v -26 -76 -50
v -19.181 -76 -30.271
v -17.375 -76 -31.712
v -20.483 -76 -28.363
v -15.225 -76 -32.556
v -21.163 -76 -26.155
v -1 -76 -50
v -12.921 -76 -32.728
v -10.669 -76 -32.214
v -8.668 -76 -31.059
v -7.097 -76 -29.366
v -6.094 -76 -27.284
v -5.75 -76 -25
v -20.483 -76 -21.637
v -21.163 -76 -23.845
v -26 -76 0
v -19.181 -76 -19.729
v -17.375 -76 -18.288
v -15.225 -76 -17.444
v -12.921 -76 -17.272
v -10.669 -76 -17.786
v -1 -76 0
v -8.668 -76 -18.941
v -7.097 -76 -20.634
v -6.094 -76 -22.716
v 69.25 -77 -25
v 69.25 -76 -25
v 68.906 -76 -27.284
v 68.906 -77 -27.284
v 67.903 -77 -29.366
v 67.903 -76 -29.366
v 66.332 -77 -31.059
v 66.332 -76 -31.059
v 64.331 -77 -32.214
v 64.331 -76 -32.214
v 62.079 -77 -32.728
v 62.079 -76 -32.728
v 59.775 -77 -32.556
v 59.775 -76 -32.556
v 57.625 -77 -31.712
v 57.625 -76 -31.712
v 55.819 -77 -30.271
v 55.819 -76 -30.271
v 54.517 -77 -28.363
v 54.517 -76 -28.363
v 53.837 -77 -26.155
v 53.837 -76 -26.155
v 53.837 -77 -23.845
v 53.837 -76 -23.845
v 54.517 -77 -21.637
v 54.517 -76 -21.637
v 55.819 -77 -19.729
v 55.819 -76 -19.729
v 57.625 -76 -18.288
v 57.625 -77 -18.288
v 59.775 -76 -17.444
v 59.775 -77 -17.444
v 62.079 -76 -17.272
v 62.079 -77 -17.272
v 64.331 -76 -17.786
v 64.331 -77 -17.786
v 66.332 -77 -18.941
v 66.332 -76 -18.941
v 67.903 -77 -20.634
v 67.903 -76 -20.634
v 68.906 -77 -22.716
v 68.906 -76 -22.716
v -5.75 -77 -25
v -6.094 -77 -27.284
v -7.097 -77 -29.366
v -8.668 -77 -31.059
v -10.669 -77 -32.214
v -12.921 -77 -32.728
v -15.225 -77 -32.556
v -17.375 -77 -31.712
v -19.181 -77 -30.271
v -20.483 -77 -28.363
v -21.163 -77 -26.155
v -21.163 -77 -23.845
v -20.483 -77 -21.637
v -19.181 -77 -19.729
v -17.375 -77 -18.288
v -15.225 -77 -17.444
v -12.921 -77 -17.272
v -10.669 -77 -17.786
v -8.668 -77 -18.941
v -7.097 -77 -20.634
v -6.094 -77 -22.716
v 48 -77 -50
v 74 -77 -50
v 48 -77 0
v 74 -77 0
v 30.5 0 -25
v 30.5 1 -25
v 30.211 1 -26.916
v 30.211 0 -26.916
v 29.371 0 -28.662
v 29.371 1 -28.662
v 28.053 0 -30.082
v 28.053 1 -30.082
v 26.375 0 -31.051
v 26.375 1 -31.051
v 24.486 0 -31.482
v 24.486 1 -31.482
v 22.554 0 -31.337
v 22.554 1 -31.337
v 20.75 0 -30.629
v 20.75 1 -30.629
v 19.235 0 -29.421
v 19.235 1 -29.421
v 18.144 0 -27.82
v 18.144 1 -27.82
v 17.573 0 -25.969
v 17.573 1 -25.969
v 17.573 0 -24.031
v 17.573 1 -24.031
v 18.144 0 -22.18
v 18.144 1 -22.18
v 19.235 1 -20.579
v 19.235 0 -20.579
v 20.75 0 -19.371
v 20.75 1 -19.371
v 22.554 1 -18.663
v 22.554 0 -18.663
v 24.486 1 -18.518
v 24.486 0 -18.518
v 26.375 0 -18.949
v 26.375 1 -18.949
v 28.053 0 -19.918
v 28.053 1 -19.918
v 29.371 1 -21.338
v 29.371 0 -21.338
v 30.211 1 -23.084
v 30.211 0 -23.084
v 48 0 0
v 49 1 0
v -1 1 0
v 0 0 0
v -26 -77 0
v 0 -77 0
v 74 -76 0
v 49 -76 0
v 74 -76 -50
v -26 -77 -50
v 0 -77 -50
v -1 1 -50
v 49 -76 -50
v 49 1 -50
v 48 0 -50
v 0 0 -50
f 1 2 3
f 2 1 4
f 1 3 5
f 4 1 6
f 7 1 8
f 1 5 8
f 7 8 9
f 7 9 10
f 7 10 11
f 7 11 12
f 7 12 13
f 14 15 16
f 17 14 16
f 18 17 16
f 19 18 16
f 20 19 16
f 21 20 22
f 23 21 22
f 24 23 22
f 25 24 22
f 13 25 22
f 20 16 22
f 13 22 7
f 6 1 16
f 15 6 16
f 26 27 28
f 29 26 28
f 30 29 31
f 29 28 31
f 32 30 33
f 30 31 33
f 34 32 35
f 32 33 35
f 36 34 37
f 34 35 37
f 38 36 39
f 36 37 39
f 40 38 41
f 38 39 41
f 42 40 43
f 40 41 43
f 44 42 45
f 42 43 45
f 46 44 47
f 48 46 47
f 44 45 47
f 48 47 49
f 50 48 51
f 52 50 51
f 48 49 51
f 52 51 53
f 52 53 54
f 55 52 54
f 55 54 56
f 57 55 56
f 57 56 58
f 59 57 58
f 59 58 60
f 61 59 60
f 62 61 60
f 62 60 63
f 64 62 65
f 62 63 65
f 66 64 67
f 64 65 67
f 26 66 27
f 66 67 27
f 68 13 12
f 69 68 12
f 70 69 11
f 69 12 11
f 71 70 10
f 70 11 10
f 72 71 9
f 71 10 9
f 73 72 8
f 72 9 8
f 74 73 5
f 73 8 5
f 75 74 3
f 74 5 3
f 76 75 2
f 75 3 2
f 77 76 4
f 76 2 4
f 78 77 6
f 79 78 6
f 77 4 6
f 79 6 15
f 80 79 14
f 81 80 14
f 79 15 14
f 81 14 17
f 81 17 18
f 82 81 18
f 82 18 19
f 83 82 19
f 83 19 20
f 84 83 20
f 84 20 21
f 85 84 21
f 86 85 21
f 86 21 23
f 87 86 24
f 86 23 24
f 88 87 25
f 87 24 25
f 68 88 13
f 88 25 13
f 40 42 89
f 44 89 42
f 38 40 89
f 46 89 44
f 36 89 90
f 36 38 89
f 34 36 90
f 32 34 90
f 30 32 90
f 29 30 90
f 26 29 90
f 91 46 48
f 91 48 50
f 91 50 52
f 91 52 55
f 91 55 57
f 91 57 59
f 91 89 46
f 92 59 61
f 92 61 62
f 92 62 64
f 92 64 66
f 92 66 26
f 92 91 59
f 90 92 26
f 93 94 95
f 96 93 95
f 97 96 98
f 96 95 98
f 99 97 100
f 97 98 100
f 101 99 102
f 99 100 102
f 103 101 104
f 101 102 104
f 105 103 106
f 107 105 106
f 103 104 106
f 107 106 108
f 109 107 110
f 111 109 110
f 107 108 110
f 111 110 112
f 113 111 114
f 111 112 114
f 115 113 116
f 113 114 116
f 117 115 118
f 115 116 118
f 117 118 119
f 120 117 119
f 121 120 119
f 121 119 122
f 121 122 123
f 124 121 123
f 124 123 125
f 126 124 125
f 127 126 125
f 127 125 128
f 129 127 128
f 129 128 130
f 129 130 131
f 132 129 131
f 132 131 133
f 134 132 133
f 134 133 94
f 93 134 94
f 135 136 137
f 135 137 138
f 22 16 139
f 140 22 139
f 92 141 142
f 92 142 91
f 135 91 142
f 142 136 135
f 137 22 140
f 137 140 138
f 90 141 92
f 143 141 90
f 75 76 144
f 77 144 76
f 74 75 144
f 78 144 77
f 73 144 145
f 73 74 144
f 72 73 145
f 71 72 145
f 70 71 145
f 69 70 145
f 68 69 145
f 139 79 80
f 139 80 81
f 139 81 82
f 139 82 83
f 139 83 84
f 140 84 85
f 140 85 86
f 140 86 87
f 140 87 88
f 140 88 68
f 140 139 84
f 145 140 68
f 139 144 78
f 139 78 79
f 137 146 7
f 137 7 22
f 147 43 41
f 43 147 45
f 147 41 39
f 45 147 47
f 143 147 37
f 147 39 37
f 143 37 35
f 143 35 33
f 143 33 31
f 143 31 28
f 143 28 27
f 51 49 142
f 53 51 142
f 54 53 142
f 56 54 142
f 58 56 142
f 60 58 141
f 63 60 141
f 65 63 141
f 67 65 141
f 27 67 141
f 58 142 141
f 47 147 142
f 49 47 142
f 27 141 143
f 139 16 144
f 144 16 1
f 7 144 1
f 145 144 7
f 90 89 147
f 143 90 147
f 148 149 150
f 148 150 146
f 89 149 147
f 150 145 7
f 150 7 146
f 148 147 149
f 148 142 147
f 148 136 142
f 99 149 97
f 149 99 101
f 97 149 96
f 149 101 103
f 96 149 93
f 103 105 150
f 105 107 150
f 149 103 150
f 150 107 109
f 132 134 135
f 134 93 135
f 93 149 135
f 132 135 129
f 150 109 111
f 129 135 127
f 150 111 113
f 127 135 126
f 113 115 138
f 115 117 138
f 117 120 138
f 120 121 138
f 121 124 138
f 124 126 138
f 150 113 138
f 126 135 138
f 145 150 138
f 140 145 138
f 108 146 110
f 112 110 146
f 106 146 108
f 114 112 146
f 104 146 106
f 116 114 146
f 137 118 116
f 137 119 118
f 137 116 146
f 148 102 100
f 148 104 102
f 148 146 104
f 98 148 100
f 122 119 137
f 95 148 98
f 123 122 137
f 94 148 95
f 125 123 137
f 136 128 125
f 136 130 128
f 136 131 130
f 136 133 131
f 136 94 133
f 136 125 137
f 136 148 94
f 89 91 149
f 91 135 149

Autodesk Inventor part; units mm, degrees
ref_plane "YZ Plane" through (0, 0, 0) normal (1, 0, 0) x (0, 1, 0)
ref_plane "XZ Plane" through (0, 0, 0) normal (0, 1, 0) x (-1, 0, 0)
ref_plane "XY Plane" through (0, 0, 0) normal (0, 0, 1) x (1, 0, 0)
sketch "Sketch1" plane through (0, 0, 0) normal (0, 1, 0) x (-1, 0, 0)
  line L0 (0, 0) -> (-48, 0)
  line L1 (-48, 0) -> (-48, -50)
  line L2 (-48, -50) -> (0, -50)
  line L3 (0, -50) -> (0, 0)
  dimension "d0" = 48
  dimension "d1" = 50
extrude "Extrusion1" add sketch "Sketch1" along normal blind 1
sketch "Sketch2" plane through (48, 0, 0) normal (1, 0, 0) x (0, 0, -1)
  line L0 (0, 1) -> (50, 1) projected
  line L1 (0, 1) -> (50, 1)
  line L2 (50, 1) -> (50, -76)
  line L3 (50, -76) -> (0, -76)
  line L4 (0, -76) -> (0, 1)
  point P0 (0, 0)
  dimension "d4" = 50
  dimension "d5" = 77
extrude "Extrusion2" add sketch "Sketch2" along normal blind 1
sketch "Sketch3" plane through (0, 0, -50) normal (-1, 0, 0) x (0, 0, 1)
  line L0 (0, 0) -> (0, 1) projected
  line L1 (50, 0) -> (50, -76) projected
  line L2 (0, 1) -> (50, 1)
  line L3 (50, 1) -> (50, -76)
  line L4 (50, -76) -> (0, -76)
  line L5 (0, -76) -> (0, 1)
extrude "Extrusion3" add sketch "Sketch3" along normal blind 1
sketch "Sketch4" plane through (0, 1, 0) normal (0, 1, 0) x (1, 0, 0)
  point P0 (0, 0)
sketch "Sketch5" plane through (0, -76, -50) normal (0, -1, 0) x (1, 0, 0)
  line L0 (0, 50) -> (-26, 50)
  line L1 (-26, 50) -> (-26, 0)
  line L2 (-26, 0) -> (0, 0)
  line L3 (0, 0) -> (0, 50)
  line L4 (48, 50) -> (48, 0) projected
  line L5 (48, 50) -> (74, 50)
  line L6 (74, 50) -> (74, 0)
  line L7 (74, 0) -> (48, 0)
  line L8 (48, 0) -> (48, 50)
  dimension "d10" = 26
  dimension "d11" = 26
extrude "Extrusion4" add sketch "Sketch5" along normal blind 1
sketch "Sketch6" plane through (0, 1, 0) normal (0, 1, 0) x (1, 0, 0)
  circle A0 centre (24, 25) radius 6.5
  line L0 (-1, 50) -> (49, 50) projected
  line L1 (49, 50) -> (49, 0) projected
  line L2 (49, 50) -> (74, 50) projected
  line L3 (74, 50) -> (74, 0) projected
  line L4 (-26, 50) -> (-1, 50) projected
  line L5 (-26, 0) -> (-26, 50) projected
  point P0 (0, 0)
  dimension "d14" = 13
  dimension "d17" = 25
  dimension "d18" = 25
extrude "Extrusion5" cut sketch "Sketch6" against normal blind 1
sketch "Sketch7" plane through (0, -76, -50) normal (0, 1, 0) x (1, 0, 0)
  circle A0 centre (61.5, -25) radius 7.75
  circle A1 centre (-13.5, -25) radius 7.75
  line L0 (-26, 0) -> (-1, 0) projected
  line L1 (-26, -50) -> (-26, 0) projected
  line L2 (74, 0) -> (74, -50) projected
  line L3 (49, 0) -> (74, 0) projected
  point P0 (0, -50)
  dimension "d25" = 15.5
  dimension "d26" = 15.5
  dimension "d27" = 25
  dimension "d28" = 12.5
  dimension "d29" = 12.5
  dimension "d30" = 25
extrude "Extrusion6" cut sketch "Sketch7" against normal blind 15.5
equation "\"d31\" = d25"
properties part number "cla3" material "Iron, Cast"
